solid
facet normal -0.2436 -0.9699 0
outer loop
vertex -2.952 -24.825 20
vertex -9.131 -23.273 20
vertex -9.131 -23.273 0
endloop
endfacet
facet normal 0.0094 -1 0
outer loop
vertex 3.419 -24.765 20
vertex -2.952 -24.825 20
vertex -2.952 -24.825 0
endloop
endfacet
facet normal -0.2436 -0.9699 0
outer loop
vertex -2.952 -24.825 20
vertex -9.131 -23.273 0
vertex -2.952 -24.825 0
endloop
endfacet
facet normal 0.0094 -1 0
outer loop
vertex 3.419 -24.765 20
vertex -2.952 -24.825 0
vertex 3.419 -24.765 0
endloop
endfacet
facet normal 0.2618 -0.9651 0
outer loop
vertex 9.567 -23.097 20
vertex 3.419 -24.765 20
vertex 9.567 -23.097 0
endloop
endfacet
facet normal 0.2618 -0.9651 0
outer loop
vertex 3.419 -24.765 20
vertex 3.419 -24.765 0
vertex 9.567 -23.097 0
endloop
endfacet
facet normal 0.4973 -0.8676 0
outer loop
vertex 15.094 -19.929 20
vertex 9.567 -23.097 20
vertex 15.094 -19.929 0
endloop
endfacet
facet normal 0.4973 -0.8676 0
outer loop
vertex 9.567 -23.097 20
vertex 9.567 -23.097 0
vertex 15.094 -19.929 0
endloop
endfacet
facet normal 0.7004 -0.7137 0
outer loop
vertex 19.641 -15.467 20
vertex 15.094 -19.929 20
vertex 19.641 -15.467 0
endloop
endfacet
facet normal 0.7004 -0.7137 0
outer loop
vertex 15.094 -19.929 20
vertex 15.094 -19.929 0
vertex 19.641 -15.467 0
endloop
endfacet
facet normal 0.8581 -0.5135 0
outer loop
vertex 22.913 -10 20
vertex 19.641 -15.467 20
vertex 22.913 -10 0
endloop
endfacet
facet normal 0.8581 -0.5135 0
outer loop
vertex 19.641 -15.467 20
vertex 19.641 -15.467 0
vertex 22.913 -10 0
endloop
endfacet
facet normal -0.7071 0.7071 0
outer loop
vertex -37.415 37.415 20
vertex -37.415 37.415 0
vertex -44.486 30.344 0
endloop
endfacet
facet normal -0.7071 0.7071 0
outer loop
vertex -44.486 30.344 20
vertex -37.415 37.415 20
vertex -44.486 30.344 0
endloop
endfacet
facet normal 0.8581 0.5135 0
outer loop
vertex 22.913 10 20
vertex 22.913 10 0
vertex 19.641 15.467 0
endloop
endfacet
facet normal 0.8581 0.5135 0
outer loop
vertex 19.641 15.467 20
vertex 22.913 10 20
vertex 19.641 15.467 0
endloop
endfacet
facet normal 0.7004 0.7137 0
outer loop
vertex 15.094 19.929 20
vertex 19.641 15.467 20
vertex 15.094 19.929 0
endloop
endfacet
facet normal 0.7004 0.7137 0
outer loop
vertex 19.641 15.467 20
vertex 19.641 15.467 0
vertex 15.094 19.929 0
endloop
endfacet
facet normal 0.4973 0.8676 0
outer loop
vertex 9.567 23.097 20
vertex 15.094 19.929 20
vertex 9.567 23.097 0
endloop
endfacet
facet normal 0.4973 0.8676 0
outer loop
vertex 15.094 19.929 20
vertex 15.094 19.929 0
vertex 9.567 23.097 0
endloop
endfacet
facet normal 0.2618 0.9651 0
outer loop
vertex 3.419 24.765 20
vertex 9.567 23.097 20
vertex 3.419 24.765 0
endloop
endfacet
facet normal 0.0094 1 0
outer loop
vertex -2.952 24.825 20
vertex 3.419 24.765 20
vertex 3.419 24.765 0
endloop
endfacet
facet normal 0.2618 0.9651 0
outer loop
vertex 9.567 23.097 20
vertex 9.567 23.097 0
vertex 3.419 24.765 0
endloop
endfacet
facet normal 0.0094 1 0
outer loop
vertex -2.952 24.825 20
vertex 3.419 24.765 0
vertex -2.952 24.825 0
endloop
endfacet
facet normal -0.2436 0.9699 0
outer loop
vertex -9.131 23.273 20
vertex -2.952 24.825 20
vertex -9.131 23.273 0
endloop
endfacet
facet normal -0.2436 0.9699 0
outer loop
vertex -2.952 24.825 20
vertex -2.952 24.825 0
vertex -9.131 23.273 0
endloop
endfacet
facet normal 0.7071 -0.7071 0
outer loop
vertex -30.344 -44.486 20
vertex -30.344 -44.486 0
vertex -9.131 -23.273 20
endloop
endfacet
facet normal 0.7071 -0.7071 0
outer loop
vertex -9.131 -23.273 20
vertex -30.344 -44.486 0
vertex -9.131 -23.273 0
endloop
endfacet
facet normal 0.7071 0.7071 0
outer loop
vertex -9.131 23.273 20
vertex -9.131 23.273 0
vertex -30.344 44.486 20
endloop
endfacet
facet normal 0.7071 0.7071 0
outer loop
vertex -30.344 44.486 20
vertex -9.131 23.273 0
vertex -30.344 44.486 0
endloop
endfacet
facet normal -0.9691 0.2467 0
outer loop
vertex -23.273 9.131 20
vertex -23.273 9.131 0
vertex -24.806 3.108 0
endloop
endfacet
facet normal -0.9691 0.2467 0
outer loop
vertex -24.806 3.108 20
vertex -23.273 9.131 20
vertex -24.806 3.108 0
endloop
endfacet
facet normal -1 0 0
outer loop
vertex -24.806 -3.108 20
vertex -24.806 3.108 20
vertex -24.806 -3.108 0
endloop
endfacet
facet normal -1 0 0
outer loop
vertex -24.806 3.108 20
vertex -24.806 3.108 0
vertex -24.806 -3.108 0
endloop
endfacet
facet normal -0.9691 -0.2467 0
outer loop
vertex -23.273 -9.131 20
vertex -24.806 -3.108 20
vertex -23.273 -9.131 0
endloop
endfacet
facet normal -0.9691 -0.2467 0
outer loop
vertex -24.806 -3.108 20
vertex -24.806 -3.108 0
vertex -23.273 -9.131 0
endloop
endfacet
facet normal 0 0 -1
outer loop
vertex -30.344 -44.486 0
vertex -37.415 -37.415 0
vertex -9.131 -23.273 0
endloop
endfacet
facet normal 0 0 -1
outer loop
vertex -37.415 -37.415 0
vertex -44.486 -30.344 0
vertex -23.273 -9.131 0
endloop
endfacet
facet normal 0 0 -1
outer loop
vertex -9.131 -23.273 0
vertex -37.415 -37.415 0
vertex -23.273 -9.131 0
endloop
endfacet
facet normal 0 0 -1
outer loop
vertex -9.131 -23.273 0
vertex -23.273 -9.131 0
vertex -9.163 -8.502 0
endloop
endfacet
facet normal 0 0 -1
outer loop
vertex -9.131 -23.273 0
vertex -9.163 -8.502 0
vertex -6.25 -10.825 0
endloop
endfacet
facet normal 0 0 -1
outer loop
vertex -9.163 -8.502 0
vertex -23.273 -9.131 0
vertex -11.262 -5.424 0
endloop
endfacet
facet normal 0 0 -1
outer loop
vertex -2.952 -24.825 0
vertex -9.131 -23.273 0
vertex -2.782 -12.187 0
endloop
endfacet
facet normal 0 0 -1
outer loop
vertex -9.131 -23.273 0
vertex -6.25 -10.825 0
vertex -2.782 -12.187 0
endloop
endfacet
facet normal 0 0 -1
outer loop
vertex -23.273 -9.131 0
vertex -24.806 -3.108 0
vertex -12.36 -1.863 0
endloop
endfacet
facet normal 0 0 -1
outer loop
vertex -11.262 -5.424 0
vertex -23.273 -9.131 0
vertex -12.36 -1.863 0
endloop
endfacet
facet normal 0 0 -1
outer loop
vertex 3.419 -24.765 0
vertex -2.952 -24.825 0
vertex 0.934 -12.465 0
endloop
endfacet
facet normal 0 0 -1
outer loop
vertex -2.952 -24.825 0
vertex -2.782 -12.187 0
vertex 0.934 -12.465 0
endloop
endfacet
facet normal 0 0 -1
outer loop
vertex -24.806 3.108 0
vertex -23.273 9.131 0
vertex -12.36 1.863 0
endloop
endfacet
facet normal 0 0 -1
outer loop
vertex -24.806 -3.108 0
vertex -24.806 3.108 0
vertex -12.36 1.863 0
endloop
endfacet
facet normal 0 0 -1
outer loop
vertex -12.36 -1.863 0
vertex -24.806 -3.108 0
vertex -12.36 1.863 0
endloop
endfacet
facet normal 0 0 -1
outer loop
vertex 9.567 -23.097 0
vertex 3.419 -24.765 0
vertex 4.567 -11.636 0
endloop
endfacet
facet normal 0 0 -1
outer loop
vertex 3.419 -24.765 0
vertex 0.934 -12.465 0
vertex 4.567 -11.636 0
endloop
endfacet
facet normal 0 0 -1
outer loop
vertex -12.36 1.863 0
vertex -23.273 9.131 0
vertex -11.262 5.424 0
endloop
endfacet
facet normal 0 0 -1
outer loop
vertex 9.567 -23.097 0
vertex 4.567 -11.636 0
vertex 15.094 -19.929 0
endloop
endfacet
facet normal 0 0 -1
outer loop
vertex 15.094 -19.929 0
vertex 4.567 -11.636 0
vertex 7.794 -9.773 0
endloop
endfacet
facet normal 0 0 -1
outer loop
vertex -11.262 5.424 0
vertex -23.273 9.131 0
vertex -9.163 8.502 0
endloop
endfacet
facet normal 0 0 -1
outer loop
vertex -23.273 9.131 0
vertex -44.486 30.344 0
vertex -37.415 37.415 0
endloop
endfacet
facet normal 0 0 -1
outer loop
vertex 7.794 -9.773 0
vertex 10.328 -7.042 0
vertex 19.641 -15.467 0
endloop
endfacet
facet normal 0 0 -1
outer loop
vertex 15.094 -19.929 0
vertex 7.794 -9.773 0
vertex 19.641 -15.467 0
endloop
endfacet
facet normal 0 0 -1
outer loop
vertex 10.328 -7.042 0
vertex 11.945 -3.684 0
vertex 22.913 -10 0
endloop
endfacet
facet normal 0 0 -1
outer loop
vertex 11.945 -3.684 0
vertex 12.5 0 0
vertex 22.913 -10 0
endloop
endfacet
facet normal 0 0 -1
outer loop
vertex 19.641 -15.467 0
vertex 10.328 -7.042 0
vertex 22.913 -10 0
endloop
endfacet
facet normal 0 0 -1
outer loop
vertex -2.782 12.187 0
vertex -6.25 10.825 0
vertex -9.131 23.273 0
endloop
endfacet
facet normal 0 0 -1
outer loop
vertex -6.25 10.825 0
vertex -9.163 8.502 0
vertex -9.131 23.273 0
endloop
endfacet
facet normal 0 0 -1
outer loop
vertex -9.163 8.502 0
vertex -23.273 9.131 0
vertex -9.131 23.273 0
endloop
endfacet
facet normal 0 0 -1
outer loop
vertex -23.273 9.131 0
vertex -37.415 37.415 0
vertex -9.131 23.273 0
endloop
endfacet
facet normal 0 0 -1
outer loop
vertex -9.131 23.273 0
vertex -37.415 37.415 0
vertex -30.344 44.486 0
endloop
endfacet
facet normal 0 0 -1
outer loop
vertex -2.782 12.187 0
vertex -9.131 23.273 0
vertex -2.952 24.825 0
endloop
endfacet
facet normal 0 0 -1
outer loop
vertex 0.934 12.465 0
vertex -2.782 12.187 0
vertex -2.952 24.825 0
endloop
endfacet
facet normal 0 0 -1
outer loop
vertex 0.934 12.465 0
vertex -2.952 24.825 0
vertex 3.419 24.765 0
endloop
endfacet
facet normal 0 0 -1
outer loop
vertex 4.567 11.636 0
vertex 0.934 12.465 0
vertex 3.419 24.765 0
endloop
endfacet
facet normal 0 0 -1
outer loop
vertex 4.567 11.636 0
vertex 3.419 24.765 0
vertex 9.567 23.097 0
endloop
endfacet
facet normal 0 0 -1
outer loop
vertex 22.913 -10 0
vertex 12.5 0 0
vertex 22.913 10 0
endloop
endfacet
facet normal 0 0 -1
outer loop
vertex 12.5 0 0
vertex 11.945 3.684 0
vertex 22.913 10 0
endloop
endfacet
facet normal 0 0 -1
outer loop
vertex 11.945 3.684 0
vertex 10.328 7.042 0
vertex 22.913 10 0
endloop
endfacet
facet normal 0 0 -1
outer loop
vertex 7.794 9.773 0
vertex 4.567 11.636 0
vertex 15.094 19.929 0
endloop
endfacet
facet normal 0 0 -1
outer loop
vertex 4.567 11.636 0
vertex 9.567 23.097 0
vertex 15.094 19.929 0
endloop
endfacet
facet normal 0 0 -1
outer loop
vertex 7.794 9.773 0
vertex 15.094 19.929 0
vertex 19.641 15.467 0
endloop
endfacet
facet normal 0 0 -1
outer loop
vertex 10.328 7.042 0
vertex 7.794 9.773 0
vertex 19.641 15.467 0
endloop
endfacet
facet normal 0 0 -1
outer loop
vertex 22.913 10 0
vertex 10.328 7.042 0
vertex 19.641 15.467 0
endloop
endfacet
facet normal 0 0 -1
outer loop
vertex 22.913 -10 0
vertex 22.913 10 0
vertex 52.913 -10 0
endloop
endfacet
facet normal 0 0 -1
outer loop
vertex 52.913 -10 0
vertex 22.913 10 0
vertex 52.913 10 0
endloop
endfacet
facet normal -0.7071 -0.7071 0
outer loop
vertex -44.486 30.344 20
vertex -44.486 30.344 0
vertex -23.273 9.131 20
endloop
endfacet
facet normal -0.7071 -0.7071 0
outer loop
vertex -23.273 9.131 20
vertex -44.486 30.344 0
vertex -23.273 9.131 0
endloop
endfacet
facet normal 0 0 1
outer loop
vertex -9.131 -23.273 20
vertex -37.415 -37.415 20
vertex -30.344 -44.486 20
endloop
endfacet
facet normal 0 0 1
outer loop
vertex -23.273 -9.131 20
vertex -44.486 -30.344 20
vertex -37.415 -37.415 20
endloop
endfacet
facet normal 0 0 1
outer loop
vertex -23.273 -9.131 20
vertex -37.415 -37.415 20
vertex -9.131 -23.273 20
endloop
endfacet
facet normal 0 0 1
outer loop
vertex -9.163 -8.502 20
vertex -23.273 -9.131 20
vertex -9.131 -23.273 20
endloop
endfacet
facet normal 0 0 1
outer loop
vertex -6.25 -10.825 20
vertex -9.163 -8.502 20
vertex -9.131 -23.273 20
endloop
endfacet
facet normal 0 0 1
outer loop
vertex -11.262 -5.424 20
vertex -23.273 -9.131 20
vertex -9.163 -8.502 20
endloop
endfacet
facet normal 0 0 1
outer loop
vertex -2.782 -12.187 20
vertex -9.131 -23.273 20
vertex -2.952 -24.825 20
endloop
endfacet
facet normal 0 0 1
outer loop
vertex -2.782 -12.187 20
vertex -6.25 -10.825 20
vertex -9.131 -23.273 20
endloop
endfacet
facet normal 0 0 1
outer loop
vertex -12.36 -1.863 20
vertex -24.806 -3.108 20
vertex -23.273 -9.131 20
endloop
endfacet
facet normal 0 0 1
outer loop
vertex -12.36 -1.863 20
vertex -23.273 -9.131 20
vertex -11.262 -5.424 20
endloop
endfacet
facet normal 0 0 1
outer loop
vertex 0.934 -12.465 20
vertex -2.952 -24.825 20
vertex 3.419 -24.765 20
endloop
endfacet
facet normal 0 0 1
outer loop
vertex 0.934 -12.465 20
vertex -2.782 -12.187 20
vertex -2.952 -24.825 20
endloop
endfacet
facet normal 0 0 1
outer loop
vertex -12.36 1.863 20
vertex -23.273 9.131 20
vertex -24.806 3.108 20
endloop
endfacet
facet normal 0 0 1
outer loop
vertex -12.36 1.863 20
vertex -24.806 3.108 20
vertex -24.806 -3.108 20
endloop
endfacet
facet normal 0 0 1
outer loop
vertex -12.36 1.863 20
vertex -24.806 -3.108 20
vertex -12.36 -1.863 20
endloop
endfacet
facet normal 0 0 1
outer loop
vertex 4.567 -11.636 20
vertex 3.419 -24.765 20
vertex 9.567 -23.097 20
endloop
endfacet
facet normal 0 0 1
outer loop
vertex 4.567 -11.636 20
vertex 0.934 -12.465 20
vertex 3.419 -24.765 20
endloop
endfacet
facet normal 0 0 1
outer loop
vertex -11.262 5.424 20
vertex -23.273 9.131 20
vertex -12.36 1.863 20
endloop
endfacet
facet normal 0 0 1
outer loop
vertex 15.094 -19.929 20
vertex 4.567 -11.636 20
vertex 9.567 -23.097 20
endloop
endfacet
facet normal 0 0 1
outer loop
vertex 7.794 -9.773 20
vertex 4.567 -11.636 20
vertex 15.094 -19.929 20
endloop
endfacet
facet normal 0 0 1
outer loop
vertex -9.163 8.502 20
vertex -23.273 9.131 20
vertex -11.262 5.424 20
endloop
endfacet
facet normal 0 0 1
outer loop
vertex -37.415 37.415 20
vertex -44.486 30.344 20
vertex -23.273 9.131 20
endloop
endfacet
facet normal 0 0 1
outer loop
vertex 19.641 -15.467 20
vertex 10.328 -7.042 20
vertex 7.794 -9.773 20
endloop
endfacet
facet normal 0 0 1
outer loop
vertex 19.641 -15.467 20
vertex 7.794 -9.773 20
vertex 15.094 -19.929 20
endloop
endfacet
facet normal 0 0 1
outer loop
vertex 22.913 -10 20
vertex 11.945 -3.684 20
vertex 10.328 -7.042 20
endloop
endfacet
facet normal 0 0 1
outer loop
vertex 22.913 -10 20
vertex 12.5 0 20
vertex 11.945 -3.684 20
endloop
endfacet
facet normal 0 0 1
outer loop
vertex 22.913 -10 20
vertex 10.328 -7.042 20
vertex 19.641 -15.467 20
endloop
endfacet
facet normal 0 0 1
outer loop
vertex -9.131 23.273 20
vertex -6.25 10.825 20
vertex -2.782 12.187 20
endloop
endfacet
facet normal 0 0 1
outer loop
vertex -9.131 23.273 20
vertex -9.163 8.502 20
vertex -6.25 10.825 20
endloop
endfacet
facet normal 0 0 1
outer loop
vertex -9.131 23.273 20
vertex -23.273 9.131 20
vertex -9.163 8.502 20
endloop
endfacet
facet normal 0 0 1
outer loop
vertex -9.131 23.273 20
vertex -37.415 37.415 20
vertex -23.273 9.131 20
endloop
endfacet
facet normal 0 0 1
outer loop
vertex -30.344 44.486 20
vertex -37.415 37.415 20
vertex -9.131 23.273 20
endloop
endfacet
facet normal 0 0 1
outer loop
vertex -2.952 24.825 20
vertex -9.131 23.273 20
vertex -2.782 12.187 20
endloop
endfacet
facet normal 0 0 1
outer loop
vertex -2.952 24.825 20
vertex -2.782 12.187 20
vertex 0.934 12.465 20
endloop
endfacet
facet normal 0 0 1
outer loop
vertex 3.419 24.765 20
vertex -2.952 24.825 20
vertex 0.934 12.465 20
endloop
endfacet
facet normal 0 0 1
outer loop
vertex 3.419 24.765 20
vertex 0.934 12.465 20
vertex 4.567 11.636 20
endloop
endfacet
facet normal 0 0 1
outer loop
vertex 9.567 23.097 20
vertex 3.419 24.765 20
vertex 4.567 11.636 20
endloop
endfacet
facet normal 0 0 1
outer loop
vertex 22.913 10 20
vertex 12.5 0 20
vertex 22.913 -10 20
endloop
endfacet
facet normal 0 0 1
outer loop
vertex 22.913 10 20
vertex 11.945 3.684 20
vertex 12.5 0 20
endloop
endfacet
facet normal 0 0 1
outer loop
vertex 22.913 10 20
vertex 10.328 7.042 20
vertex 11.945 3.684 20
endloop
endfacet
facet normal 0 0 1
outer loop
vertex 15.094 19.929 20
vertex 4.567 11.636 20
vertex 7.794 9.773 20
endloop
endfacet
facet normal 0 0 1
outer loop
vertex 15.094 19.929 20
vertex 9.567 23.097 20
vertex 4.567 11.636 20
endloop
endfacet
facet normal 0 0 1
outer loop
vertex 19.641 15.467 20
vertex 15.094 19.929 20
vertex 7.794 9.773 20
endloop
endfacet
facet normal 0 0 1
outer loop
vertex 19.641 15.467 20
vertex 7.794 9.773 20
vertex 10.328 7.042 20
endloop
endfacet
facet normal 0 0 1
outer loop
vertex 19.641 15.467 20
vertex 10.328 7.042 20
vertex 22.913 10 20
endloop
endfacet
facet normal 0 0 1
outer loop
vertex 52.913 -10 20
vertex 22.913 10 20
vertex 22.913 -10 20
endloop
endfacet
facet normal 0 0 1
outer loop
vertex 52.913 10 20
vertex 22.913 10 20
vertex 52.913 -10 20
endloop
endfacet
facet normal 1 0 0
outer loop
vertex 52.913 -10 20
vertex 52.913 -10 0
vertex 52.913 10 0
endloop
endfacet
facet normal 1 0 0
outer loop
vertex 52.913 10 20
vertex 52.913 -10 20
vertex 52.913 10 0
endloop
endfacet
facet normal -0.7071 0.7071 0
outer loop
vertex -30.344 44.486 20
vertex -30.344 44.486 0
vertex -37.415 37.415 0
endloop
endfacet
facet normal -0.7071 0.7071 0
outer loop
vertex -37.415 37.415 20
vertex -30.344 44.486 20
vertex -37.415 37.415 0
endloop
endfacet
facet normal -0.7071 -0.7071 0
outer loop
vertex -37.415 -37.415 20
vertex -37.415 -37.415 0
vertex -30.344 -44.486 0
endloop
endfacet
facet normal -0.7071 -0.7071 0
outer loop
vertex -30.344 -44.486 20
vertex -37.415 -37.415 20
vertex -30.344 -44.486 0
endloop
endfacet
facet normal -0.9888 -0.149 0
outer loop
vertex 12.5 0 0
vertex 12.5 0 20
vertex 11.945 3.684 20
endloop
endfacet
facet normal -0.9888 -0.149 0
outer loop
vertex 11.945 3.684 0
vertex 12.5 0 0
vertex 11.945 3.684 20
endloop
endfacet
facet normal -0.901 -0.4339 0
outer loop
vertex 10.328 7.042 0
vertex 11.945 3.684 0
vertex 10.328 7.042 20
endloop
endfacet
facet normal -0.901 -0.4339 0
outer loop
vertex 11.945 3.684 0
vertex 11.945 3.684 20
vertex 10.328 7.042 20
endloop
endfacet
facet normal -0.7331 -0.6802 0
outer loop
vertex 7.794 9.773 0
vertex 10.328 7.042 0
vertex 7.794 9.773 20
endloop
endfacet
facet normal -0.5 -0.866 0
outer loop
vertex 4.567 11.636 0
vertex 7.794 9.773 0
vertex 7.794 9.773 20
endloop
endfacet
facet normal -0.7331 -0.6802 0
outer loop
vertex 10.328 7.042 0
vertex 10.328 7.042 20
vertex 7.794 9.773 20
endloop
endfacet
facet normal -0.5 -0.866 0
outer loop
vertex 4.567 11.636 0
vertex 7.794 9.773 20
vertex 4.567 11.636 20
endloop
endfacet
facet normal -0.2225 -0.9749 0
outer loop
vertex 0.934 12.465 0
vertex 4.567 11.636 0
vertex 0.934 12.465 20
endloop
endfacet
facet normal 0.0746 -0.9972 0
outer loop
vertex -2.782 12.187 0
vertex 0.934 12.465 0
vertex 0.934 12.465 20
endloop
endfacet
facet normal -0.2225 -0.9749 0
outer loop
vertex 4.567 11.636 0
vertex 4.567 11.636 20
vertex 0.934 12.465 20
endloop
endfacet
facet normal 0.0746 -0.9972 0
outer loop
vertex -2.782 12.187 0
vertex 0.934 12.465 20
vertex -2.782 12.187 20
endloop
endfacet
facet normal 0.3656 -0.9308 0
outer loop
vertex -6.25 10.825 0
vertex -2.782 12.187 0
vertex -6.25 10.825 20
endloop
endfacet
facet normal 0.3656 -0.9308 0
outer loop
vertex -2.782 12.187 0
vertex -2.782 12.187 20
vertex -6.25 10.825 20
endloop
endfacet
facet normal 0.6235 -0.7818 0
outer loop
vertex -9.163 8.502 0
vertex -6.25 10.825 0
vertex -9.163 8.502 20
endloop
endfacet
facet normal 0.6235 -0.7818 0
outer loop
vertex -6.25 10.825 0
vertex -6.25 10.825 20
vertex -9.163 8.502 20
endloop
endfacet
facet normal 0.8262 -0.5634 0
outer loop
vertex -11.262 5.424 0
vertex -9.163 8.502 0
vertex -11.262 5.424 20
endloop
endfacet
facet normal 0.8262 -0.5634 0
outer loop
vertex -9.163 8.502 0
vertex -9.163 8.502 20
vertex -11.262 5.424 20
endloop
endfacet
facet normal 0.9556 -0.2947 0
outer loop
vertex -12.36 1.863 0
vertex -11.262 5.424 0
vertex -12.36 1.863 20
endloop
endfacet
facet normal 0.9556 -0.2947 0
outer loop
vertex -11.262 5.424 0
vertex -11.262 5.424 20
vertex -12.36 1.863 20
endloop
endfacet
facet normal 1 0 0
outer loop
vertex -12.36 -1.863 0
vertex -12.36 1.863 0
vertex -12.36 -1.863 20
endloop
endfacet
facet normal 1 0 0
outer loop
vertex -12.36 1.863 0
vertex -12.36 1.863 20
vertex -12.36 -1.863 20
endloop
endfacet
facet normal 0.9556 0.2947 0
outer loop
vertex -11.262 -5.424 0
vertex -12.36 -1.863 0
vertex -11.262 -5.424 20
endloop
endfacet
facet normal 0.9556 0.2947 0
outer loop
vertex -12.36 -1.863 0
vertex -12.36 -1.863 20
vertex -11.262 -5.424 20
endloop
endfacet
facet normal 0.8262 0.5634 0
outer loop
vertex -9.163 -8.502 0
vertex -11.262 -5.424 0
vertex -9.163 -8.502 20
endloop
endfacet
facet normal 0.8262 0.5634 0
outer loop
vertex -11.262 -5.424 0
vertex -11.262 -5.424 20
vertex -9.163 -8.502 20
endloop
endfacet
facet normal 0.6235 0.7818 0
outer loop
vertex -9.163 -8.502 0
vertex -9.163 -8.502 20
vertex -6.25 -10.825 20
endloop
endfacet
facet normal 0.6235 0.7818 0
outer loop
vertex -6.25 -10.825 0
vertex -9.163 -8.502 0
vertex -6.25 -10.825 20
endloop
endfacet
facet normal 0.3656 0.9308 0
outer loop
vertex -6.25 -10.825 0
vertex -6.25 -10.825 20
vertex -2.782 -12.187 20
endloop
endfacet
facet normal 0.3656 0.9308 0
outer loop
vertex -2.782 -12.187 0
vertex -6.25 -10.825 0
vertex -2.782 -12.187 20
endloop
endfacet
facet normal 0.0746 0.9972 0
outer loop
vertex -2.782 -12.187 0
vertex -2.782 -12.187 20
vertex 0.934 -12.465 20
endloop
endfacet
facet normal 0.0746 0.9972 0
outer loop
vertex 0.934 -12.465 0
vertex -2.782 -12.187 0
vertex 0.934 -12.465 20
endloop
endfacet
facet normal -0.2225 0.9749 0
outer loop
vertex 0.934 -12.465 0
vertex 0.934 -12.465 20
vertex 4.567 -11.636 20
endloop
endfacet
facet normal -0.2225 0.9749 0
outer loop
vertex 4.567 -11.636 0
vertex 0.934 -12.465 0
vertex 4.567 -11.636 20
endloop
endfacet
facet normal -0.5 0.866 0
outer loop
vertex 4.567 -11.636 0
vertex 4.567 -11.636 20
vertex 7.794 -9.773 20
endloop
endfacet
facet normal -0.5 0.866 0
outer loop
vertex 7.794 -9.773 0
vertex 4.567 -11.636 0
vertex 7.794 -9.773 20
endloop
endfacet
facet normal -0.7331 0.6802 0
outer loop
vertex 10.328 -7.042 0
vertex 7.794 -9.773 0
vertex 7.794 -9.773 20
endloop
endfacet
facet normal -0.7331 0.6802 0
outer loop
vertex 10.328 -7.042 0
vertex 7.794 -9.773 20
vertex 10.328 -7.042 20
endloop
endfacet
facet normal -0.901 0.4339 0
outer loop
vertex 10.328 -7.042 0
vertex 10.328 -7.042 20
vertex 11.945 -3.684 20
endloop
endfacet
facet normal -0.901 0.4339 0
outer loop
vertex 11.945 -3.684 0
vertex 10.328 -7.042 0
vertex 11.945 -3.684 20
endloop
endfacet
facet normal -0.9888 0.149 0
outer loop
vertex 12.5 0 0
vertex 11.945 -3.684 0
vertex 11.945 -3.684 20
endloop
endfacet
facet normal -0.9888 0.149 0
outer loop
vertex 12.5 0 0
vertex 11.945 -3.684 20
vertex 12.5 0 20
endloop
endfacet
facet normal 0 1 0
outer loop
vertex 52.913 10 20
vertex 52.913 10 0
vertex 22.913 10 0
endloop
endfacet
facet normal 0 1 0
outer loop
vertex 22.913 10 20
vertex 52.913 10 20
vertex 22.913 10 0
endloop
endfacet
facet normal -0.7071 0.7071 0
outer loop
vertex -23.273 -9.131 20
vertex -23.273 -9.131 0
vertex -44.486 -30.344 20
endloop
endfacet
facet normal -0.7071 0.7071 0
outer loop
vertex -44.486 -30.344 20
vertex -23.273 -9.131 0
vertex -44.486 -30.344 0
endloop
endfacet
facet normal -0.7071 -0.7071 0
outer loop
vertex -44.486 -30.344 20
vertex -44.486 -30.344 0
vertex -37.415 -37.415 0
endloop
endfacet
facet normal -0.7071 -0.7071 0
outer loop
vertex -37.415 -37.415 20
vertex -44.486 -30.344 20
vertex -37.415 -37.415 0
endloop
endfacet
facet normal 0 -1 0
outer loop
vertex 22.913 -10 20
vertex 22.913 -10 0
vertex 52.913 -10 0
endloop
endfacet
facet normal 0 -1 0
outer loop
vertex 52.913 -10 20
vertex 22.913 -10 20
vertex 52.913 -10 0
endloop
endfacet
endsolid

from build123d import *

# Parameters (mm, degrees)
F2_DEPTH = 20
F3_R     = 12.5
F4_DEPTH = 25


with BuildPart() as f2:
    # F1 (on Top) → F2 (new body)
    with BuildSketch(Plane.XY):
        with BuildLine():
            ThreePointArc((22.9128784748, -10), (24.4726578233, -5.1077410922), (25, 0))
            ThreePointArc((25, 0), (24.4726578233, 5.1077410922), (22.9128784748, 10))
            Line((22.9128784748, 10), (22.9128784748, 0))
            Line((22.9128784748, 0), (22.9128784748, -10))
        make_face()
        with BuildLine():
            ThreePointArc((22.9128784748, 10), (24.4726578233, 5.1077410922), (25, 0))
            ThreePointArc((25, 0), (24.4726578233, -5.1077410922), (22.9128784748, -10))
            Line((22.9128784748, -10), (52.9128784748, -10))
            Line((52.9128784748, -10), (52.9128784748, 10))
            Line((52.9128784748, 10), (22.9128784748, 10))
        make_face()
        with BuildLine():
            Line((22.9128784748, 0), (22.9128784748, 10))
            ThreePointArc((22.9128784748, 10), (9.5670858091, 23.0969883128), (-9.1307839342, 23.2729195579))
            Line((-9.1307839342, 23.2729195579), (-23.2729195579, 9.1307839342))
            ThreePointArc((-23.2729195579, 9.1307839342), (-25, 0), (-23.2729195579, -9.1307839342))
            Line((-23.2729195579, -9.1307839342), (-9.1307839342, -23.2729195579))
            ThreePointArc((-9.1307839342, -23.2729195579), (9.5670858091, -23.0969883128), (22.9128784748, -10))
            Line((22.9128784748, -10), (22.9128784748, 0))
        make_face()
        with BuildLine():
            Line((-23.2729195579, 9.1307839342), (-9.1307839342, 23.2729195579))
            ThreePointArc((-9.1307839342, 23.2729195579), (-17.6776695297, 17.6776695297), (-23.2729195579, 9.1307839342))
        make_face()
        with BuildLine():
            ThreePointArc((-23.2729195579, 9.1307839342), (-17.6776695297, 17.6776695297), (-9.1307839342, 23.2729195579))
            Line((-9.1307839342, 23.2729195579), (-30.3439873698, 44.4861229935))
            Line((-30.3439873698, 44.4861229935), (-37.4150551816, 37.4150551816))
            Line((-37.4150551816, 37.4150551816), (-44.4861229935, 30.3439873698))
            Line((-44.4861229935, 30.3439873698), (-23.2729195579, 9.1307839342))
        make_face()
        with BuildLine():
            Line((-30.3439873698, -44.4861229935), (-9.1307839342, -23.2729195579))
            ThreePointArc((-9.1307839342, -23.2729195579), (-17.6776695297, -17.6776695297), (-23.2729195579, -9.1307839342))
            Line((-23.2729195579, -9.1307839342), (-44.4861229935, -30.3439873698))
            Line((-44.4861229935, -30.3439873698), (-37.4150551816, -37.4150551816))
            Line((-37.4150551816, -37.4150551816), (-30.3439873698, -44.4861229935))
        make_face()
        with BuildLine():
            ThreePointArc((-23.2729195579, -9.1307839342), (-17.6776695297, -17.6776695297), (-9.1307839342, -23.2729195579))
            Line((-9.1307839342, -23.2729195579), (-23.2729195579, -9.1307839342))
        make_face()
    extrude(amount=F2_DEPTH)

    # F3 (on face) → F4 (cut)
    with BuildSketch(Plane.XY.offset(20)):
        Circle(F3_R)
    extrude(amount=-F4_DEPTH, mode=Mode.SUBTRACT)


solid = f2.part
